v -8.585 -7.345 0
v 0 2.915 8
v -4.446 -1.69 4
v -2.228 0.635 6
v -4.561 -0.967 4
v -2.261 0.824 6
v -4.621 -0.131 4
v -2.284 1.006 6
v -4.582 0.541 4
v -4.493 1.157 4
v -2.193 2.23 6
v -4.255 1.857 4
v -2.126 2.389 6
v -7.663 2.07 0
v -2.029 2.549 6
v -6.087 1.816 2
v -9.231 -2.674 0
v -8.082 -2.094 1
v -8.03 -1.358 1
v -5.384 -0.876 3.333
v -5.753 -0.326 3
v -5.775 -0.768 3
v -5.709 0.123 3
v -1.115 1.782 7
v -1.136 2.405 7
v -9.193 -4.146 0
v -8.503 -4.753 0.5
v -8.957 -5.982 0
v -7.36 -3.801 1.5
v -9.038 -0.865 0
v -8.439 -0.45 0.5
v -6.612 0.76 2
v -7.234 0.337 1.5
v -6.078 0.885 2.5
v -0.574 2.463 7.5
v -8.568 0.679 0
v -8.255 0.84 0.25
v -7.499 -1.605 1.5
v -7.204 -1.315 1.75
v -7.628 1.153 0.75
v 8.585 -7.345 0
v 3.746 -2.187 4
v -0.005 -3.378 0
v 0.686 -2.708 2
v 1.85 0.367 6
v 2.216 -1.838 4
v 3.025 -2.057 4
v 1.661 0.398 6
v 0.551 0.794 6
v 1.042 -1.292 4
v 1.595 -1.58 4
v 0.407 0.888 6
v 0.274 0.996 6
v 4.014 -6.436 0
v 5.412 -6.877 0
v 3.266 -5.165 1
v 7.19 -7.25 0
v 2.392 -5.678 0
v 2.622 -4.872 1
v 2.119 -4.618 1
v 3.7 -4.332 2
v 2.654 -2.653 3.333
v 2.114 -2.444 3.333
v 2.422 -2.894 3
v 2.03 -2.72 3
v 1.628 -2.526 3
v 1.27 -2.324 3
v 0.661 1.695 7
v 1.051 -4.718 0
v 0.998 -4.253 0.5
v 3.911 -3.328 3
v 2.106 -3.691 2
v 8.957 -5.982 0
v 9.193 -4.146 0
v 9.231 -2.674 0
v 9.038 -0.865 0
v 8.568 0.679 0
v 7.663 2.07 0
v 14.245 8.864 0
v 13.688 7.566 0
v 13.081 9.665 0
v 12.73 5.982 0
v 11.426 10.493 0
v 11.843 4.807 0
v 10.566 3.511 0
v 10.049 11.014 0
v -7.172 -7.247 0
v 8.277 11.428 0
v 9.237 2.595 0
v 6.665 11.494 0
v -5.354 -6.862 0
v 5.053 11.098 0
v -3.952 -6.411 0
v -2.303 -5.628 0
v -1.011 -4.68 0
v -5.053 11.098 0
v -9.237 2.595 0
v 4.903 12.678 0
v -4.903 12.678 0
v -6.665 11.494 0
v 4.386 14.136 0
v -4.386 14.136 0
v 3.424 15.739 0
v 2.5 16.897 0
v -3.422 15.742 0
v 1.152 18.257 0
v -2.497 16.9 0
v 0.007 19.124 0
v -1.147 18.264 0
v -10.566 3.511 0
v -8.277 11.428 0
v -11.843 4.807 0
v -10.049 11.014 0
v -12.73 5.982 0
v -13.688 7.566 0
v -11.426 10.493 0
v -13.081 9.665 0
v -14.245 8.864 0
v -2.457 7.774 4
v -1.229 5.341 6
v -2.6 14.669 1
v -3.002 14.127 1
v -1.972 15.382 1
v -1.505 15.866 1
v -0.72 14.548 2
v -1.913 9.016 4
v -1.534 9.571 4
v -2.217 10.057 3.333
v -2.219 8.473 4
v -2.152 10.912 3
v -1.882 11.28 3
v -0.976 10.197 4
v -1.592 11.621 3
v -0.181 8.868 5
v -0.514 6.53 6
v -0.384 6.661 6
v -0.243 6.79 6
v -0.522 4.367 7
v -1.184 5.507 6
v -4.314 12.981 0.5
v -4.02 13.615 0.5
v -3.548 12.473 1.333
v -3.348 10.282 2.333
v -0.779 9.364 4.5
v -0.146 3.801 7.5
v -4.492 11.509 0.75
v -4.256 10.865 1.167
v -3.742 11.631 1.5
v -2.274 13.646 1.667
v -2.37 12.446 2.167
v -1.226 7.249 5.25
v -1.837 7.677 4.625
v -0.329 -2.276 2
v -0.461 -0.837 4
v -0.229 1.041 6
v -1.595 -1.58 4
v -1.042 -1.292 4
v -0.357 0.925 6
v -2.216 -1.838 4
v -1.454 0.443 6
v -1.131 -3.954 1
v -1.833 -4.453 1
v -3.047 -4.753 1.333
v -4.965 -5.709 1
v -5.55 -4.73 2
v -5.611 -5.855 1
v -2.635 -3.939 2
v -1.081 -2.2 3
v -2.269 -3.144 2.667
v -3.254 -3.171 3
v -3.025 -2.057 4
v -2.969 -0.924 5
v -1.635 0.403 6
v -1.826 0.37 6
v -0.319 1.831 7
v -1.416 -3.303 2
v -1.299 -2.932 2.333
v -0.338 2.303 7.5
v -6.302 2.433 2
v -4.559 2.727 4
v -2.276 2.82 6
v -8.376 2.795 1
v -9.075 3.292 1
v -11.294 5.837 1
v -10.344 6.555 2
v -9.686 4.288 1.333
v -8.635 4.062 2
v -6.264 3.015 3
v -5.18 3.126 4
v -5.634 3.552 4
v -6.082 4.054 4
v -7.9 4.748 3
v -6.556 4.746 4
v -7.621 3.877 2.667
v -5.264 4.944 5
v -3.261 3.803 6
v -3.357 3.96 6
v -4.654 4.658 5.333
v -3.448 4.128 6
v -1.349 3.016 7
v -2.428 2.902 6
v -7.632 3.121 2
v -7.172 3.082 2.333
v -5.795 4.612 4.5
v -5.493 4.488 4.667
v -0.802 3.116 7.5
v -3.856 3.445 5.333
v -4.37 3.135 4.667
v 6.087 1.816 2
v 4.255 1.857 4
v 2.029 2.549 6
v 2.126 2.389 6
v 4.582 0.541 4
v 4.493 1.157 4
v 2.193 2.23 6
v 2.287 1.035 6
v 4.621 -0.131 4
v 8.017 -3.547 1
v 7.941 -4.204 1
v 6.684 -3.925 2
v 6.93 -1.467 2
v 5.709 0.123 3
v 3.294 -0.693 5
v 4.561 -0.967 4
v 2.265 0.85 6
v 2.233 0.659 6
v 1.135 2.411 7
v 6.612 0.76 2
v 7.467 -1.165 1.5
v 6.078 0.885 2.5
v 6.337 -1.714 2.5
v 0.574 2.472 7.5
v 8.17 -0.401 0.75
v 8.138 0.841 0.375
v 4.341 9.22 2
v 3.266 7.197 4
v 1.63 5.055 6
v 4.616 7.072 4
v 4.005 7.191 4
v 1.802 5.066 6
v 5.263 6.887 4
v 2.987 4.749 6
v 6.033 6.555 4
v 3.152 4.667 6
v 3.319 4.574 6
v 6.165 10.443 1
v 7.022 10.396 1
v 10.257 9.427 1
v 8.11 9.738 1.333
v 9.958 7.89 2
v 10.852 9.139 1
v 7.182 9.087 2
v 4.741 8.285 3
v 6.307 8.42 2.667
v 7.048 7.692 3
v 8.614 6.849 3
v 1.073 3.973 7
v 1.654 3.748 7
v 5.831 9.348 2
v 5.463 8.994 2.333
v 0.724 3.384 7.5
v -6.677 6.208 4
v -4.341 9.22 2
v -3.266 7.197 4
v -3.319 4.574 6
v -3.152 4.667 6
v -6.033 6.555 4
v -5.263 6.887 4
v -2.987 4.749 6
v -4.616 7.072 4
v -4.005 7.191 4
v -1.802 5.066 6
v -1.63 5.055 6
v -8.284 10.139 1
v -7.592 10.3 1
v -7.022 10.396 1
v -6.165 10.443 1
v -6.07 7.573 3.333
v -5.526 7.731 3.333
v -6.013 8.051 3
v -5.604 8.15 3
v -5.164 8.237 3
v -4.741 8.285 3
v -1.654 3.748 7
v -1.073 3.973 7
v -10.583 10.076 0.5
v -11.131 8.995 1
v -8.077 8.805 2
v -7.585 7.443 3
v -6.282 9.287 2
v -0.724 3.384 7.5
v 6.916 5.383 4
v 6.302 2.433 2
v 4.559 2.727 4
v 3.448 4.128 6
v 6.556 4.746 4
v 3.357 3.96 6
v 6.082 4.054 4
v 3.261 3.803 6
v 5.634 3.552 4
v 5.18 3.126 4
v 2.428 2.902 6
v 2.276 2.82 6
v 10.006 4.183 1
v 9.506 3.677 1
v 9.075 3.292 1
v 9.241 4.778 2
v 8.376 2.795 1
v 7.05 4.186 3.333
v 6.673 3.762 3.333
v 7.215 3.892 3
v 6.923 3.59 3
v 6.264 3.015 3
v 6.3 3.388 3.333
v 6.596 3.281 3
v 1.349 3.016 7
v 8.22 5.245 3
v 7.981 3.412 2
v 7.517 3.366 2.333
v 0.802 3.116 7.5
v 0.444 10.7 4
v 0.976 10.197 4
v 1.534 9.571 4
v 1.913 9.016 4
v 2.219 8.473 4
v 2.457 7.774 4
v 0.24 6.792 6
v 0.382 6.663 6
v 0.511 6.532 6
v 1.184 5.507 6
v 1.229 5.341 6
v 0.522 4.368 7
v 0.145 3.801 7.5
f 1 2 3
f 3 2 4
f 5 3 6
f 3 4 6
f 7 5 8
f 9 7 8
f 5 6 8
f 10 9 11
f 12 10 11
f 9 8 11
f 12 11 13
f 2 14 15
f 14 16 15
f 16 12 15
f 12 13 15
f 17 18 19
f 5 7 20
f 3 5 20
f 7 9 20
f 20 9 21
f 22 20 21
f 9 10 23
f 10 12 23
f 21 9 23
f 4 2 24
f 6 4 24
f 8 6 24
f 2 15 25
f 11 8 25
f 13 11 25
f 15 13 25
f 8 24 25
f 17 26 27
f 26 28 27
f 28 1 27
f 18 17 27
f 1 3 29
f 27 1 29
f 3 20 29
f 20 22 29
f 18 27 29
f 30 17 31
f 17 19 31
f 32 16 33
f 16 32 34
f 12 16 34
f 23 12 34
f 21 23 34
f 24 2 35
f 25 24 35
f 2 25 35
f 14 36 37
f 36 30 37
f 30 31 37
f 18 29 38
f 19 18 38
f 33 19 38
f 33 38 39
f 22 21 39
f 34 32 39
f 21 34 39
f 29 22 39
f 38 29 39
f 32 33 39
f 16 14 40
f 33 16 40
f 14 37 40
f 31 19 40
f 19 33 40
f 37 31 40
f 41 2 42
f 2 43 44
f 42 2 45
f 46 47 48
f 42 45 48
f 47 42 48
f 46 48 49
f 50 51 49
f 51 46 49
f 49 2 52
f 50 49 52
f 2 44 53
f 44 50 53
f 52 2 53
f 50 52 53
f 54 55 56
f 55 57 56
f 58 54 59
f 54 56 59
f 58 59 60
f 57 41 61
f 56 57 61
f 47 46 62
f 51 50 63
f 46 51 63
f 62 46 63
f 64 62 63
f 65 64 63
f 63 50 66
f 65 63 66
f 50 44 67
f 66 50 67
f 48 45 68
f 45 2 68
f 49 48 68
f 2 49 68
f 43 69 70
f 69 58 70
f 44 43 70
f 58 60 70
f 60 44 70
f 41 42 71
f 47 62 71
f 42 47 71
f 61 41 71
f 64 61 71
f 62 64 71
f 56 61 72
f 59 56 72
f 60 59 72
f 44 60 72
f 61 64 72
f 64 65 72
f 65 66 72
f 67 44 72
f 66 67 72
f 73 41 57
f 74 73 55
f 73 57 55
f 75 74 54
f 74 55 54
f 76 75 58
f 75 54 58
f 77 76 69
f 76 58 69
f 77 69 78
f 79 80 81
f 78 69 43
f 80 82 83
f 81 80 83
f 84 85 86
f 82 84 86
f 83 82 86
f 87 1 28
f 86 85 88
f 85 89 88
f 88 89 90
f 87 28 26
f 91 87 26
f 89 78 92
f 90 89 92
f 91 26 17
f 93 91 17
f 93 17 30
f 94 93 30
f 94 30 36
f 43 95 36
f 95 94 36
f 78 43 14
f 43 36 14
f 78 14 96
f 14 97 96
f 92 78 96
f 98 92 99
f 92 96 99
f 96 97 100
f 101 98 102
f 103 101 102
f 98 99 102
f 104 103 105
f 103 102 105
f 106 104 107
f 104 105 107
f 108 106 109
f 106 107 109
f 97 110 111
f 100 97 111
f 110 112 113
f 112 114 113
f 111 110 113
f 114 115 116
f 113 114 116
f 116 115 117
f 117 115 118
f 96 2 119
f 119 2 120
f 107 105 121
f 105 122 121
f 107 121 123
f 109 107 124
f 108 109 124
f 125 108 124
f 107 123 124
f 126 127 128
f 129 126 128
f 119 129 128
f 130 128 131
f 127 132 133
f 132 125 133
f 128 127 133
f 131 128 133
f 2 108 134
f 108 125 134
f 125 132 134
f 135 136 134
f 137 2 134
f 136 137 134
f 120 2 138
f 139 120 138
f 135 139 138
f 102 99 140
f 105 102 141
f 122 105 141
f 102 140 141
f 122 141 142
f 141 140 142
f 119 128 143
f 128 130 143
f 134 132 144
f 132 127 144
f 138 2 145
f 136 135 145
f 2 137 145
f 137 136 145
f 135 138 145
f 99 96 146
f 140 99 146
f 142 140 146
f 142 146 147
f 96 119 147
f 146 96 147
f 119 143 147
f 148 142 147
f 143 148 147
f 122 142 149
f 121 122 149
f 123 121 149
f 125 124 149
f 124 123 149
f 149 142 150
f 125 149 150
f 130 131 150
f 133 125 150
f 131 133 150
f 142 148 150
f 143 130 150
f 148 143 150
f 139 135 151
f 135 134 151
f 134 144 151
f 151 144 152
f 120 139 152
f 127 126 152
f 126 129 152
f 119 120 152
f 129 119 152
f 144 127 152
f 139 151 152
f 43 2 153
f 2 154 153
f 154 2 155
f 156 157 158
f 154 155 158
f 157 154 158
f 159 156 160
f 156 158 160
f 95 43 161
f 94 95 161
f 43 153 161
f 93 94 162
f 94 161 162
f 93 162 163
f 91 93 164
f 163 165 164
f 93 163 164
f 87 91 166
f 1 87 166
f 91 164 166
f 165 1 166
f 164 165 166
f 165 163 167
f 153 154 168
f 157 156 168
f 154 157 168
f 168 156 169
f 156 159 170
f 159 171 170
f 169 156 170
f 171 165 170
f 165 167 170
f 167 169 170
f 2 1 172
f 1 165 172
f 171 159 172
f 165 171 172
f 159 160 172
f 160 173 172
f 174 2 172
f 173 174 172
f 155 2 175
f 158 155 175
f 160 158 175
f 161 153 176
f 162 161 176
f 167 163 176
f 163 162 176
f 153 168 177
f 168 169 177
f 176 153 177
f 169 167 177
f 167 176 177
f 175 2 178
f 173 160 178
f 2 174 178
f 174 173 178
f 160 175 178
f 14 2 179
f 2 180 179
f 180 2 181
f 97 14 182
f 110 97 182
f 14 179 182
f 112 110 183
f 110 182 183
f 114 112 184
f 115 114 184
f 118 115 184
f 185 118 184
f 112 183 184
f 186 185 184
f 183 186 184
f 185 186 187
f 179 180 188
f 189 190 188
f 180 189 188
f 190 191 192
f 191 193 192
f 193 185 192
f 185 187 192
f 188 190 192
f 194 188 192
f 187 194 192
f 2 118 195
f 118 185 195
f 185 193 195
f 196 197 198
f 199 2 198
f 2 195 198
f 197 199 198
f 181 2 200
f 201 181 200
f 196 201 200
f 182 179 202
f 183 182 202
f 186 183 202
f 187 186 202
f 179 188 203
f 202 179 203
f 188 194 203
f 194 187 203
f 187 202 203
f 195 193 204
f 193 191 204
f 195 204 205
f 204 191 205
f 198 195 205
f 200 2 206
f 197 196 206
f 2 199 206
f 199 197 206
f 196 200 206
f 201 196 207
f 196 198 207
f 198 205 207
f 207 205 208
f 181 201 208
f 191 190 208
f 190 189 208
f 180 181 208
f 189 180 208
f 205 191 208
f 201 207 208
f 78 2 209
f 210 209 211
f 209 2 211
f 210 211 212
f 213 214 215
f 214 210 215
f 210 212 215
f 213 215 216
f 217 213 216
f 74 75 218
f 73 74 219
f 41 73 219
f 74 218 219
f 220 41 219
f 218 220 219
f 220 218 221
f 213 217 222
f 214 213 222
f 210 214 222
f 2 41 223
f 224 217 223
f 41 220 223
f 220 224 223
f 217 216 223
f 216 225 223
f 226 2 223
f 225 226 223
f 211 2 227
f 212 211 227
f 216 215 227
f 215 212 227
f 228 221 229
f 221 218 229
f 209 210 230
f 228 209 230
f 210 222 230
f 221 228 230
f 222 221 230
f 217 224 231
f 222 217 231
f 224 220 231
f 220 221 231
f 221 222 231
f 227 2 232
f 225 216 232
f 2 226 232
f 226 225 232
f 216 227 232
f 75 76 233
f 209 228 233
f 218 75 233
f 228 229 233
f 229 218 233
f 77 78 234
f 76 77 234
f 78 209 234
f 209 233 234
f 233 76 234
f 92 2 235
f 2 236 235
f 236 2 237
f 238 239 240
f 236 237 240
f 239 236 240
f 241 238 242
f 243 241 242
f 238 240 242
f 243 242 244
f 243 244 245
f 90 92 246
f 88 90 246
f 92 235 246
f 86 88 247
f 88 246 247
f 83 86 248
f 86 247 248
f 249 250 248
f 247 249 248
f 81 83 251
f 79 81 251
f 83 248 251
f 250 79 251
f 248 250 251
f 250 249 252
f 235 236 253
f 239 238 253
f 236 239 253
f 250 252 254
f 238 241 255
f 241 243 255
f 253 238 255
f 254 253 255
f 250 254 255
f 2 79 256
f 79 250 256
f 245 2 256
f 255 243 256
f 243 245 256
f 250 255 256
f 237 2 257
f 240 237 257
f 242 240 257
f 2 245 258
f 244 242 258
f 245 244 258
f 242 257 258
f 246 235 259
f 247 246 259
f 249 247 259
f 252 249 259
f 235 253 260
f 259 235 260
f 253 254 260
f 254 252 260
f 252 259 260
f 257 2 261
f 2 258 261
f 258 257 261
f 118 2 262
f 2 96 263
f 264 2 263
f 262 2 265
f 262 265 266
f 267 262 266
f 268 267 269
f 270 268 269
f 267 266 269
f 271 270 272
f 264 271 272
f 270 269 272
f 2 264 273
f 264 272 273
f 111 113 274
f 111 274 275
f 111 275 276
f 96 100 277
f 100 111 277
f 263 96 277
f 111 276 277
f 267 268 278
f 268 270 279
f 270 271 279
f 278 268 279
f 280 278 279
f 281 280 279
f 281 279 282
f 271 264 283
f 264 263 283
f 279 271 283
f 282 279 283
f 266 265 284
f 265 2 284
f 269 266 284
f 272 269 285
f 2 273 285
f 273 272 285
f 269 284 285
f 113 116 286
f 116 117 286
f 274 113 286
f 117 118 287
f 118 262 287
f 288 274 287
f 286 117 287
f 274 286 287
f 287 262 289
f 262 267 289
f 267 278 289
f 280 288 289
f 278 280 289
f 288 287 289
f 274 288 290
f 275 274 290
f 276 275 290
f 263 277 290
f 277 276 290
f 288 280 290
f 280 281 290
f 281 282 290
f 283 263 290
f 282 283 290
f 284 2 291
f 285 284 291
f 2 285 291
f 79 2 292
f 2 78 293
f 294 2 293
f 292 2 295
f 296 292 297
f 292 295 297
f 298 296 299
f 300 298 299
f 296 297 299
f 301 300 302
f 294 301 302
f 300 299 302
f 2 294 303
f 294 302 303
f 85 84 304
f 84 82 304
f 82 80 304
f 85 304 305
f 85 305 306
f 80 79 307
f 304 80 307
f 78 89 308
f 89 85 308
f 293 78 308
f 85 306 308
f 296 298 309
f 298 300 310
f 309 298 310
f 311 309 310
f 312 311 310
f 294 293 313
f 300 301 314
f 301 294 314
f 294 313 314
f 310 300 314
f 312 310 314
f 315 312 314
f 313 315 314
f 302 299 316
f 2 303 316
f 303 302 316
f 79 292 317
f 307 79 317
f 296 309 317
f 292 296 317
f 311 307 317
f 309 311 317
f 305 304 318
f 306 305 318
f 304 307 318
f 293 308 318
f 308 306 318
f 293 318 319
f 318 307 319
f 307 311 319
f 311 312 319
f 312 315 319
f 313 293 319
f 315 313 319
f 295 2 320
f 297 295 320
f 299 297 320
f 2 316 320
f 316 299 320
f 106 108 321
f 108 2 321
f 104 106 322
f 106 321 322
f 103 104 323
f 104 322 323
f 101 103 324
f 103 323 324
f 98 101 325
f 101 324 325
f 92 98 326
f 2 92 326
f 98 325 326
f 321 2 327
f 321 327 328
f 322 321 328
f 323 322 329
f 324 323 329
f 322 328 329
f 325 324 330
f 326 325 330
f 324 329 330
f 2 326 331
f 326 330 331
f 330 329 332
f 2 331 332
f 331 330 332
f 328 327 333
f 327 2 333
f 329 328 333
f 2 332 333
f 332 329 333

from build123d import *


with BuildPart() as f3:
    # F0 (on Top) → F3 section 0
    with BuildSketch(Plane.XY, mode=Mode.PRIVATE) as f3_s0:
        with BuildLine():
            add(Edge.make_bspline(
                [(-0.0046782463, -3.3779127154), (-0.2886714116, -3.8029014086), (-0.8501646318, -4.6414908394), (-2.0614273809, -5.5342942003), (-3.191174351, -6.0830354403), (-4.4279454803, -6.6365184373), (-6.0382217073, -7.0393362104), (-7.4663821983, -7.3239460026), (-8.2320357436, -7.3357281281), (-8.5845080582, -7.3449459069)],
                knots=[0.0008153077, 0.0008153077, 0.0008153077, 0.0008153077, 0.1493003301, 0.2961209658, 0.430920111, 0.5710544916, 0.7274599749, 0.8736269908, 1, 1, 1, 1], degree=3))
            add(Edge.make_bspline(
                [(-0.0046782463, -3.3779127154), (0.2798235099, -3.8035541954), (0.8529745003, -4.6399037672), (2.0605602851, -5.5345401007), (3.1914082814, -6.0829693758), (4.427869641, -6.6365387242), (6.0382568128, -7.0393312795), (7.4663249343, -7.3239458928), (8.232133697, -7.3357306898), (8.5845080582, -7.3449459069)],
                knots=[0.0008182641, 0.0008182641, 0.0008182641, 0.0008182641, 0.1495367427, 0.2963165764, 0.4310782604, 0.5711736972, 0.7275357148, 0.8736621104, 1, 1, 1, 1], degree=3))
            add(Edge.make_bspline(
                [(7.6630854562, 2.0698141102), (7.9723899503, 1.6593058644), (8.5814688233, 0.8509923751), (9.0258247873, -0.5896309127), (9.1713935312, -1.8371303739), (9.2861520096, -3.1872328685), (9.1355219384, -4.8402792282), (8.9333390624, -6.2824190295), (8.6920191627, -7.0091437889), (8.5845080582, -7.3449459069)],
                knots=[0, 0, 0, 0, 0.1493003301, 0.2961209658, 0.430920111, 0.5710544916, 0.7274599749, 0.8736269908, 1, 1, 1, 1], degree=3))
            add(Edge.make_bspline(
                [(7.6630854562, 2.0698141102), (8.160702191, 2.1985148296), (9.1405693504, 2.4519080431), (10.3851689009, 3.3026839471), (11.2757141149, 4.18833308), (12.2060228136, 5.1734584423), (13.117239272, 6.5608791613), (13.8568123727, 7.8153418951), (14.1203788685, 8.5342972986), (14.2452946594, 8.8640210393)],
                knots=[0, 0, 0, 0, 0.1493003301, 0.2961209658, 0.430920111, 0.5710544916, 0.7274599749, 0.8736269908, 1, 1, 1, 1], degree=3))
            add(Edge.make_bspline(
                [(5.0531831504, 11.0982573286), (5.5427173943, 11.2549178341), (6.5066510316, 11.5634299302), (8.0132265607, 11.5079515111), (9.2389643074, 11.2340680663), (10.5514093429, 10.8972680023), (12.0623572586, 10.2100358132), (13.357194546, 9.5436714076), (13.9637171958, 9.0762375137), (14.2452946594, 8.8640210393)],
                knots=[0, 0, 0, 0, 0.1493003301, 0.2961209658, 0.430920111, 0.5710544916, 0.7274599749, 0.8736269908, 1, 1, 1, 1], degree=3))
            add(Edge.make_bspline(
                [(5.0531831504, 11.0982573286), (5.0476928659, 11.6139287191), (4.9874958494, 12.6338813862), (4.479140637, 14.0461168333), (3.828355926, 15.123781678), (3.0968383304, 16.263256138), (1.9678497609, 17.4808614684), (0.9314693675, 18.4982947676), (0.2948958331, 18.9254438253), (0.006837445, 19.1243654424)],
                knots=[0, 0, 0, 0, 0.1497970569, 0.2965038342, 0.4311984436, 0.571224151, 0.7275083428, 0.8735620072, 0.999007298, 0.999007298, 0.999007298, 0.999007298], degree=3))
            add(Edge.make_bspline(
                [(-5.0531831504, 11.0982573286), (-5.0476963712, 11.6135994796), (-4.9874861349, 12.6340289048), (-4.4791678329, 14.0460888589), (-3.8282636822, 15.1237632625), (-3.0972160894, 16.2633684742), (-1.9663030656, 17.4803899928), (-0.9349579983, 18.5013408383), (-0.2826014748, 18.924597477), (0.006837445, 19.1243654424)],
                knots=[0, 0, 0, 0, 0.1497014163, 0.2963145262, 0.4309231374, 0.5708594429, 0.7270438524, 0.8730042663, 0.9990043912, 0.9990043912, 0.9990043912, 0.9990043912], degree=3))
            add(Edge.make_bspline(
                [(-5.0531831504, 11.0982573286), (-5.5427173943, 11.2549178341), (-6.5066510316, 11.5634299302), (-8.0132265607, 11.5079515111), (-9.2389643074, 11.2340680663), (-10.5514093429, 10.8972680023), (-12.0623572586, 10.2100358132), (-13.357194546, 9.5436714076), (-13.9637171958, 9.0762375137), (-14.2452946594, 8.8640210393)],
                knots=[0, 0, 0, 0, 0.1493003301, 0.2961209658, 0.430920111, 0.5710544916, 0.7274599749, 0.8736269908, 1, 1, 1, 1], degree=3))
            add(Edge.make_bspline(
                [(-7.6630854562, 2.0698141102), (-8.160702191, 2.1985148296), (-9.1405693504, 2.4519080431), (-10.3851689009, 3.3026839471), (-11.2757141149, 4.18833308), (-12.2060228136, 5.1734584423), (-13.117239272, 6.5608791613), (-13.8568123727, 7.8153418951), (-14.1203788685, 8.5342972986), (-14.2452946594, 8.8640210393)],
                knots=[0, 0, 0, 0, 0.1493003301, 0.2961209658, 0.430920111, 0.5710544916, 0.7274599749, 0.8736269908, 1, 1, 1, 1], degree=3))
            add(Edge.make_bspline(
                [(-7.6630854562, 2.0698141102), (-7.9723899503, 1.6593058644), (-8.5814688233, 0.8509923751), (-9.0258247873, -0.5896309127), (-9.1713935312, -1.8371303739), (-9.2861520096, -3.1872328685), (-9.1355219384, -4.8402792282), (-8.9333390624, -6.2824190295), (-8.6920191627, -7.0091437889), (-8.5845080582, -7.3449459069)],
                knots=[0, 0, 0, 0, 0.1493003301, 0.2961209658, 0.430920111, 0.5710544916, 0.7274599749, 0.8736269908, 1, 1, 1, 1], degree=3))
        make_face()
    loft([f3_s0.sketch, Vertex(0, 2.9152445495, 8)])


solid = f3.part
